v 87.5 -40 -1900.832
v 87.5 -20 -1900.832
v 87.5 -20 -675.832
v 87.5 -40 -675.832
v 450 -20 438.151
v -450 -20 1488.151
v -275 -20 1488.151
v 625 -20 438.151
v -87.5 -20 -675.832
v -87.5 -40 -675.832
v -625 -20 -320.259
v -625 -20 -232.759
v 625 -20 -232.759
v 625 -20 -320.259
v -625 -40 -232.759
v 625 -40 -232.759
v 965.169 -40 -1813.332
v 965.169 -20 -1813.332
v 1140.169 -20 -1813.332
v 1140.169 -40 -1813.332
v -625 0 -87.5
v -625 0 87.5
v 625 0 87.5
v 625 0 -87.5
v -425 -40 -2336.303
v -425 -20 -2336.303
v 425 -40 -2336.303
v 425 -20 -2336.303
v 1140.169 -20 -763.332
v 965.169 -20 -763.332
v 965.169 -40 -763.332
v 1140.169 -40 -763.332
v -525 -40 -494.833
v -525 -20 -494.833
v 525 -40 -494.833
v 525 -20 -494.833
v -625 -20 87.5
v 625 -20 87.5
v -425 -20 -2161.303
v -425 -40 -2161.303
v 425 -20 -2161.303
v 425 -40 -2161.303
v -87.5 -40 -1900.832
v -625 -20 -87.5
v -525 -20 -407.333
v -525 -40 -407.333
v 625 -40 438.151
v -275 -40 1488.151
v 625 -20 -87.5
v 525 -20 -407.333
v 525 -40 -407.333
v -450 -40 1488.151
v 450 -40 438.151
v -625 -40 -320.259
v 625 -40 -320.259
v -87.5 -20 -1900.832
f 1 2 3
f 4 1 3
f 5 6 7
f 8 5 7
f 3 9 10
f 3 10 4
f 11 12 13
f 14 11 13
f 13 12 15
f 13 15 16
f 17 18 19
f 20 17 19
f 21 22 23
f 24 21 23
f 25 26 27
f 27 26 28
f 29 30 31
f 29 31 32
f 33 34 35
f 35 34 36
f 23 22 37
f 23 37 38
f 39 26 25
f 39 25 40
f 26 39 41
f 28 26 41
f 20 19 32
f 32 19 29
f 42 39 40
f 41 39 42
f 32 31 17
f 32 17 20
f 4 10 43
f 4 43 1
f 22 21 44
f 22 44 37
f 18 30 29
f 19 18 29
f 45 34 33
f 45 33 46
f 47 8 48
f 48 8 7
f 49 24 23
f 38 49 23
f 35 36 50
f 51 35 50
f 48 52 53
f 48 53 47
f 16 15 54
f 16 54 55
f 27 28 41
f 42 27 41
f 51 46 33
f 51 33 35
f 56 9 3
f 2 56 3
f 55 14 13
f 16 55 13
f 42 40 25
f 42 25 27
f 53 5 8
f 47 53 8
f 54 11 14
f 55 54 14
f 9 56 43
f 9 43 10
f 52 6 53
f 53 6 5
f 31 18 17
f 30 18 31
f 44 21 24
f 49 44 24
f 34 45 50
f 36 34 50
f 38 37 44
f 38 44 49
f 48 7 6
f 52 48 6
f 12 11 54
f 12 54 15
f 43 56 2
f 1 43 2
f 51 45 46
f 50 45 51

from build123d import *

# Parameters (mm, degrees)
F0_W     = 1250
F0_H     = 175
F1_DEPTH = 20
F2_W     = 1250
F2_H     = 87.5
F2_W_2   = 1050
F3_DEPTH = 20
F5_DEPTH = 20
F6_W     = 175
F6_H     = 1225
F6_W_2   = 850
F6_H_2   = 175
F6_H_3   = 1050
F7_DEPTH = 20


with BuildPart() as f1:
    # F0 (on Front) → F1 (new body)
    with BuildSketch(Plane.XZ):
        Rectangle(F0_W, F0_H)
    extrude(amount=F1_DEPTH)


with BuildPart() as f3:
    # F2 (on face) → F3 (new body)
    with BuildSketch(Plane.XZ.offset(20)):
        with Locations((0, -276.508601)):
            Rectangle(F2_W, F2_H)
        with Locations((0, -451.082736)):
            Rectangle(F2_W_2, F2_H)
    extrude(amount=F3_DEPTH)


with BuildPart() as f5:
    # F4 (on face) → F5 (new body)
    with BuildSketch(Plane.XZ.offset(20)):
        Polygon((-275, 1488.151139), (-450, 1488.151139), (450, 438.151139), (625, 438.151139), align=None)
    extrude(amount=F5_DEPTH)


with BuildPart() as f7:
    # F6 (on face) → F7 (new body)
    with BuildSketch(Plane.XZ.offset(20)):
        with Locations((0, -1288.332105)):
            Rectangle(F6_W, F6_H)
        with Locations((0, -2248.803139)):
            Rectangle(F6_W_2, F6_H_2)
        with Locations((1052.668929, -1288.332105)):
            Rectangle(F6_W, F6_H_3)
    extrude(amount=F7_DEPTH)


solid = Compound([f1.part, f3.part, f5.part, f7.part])
